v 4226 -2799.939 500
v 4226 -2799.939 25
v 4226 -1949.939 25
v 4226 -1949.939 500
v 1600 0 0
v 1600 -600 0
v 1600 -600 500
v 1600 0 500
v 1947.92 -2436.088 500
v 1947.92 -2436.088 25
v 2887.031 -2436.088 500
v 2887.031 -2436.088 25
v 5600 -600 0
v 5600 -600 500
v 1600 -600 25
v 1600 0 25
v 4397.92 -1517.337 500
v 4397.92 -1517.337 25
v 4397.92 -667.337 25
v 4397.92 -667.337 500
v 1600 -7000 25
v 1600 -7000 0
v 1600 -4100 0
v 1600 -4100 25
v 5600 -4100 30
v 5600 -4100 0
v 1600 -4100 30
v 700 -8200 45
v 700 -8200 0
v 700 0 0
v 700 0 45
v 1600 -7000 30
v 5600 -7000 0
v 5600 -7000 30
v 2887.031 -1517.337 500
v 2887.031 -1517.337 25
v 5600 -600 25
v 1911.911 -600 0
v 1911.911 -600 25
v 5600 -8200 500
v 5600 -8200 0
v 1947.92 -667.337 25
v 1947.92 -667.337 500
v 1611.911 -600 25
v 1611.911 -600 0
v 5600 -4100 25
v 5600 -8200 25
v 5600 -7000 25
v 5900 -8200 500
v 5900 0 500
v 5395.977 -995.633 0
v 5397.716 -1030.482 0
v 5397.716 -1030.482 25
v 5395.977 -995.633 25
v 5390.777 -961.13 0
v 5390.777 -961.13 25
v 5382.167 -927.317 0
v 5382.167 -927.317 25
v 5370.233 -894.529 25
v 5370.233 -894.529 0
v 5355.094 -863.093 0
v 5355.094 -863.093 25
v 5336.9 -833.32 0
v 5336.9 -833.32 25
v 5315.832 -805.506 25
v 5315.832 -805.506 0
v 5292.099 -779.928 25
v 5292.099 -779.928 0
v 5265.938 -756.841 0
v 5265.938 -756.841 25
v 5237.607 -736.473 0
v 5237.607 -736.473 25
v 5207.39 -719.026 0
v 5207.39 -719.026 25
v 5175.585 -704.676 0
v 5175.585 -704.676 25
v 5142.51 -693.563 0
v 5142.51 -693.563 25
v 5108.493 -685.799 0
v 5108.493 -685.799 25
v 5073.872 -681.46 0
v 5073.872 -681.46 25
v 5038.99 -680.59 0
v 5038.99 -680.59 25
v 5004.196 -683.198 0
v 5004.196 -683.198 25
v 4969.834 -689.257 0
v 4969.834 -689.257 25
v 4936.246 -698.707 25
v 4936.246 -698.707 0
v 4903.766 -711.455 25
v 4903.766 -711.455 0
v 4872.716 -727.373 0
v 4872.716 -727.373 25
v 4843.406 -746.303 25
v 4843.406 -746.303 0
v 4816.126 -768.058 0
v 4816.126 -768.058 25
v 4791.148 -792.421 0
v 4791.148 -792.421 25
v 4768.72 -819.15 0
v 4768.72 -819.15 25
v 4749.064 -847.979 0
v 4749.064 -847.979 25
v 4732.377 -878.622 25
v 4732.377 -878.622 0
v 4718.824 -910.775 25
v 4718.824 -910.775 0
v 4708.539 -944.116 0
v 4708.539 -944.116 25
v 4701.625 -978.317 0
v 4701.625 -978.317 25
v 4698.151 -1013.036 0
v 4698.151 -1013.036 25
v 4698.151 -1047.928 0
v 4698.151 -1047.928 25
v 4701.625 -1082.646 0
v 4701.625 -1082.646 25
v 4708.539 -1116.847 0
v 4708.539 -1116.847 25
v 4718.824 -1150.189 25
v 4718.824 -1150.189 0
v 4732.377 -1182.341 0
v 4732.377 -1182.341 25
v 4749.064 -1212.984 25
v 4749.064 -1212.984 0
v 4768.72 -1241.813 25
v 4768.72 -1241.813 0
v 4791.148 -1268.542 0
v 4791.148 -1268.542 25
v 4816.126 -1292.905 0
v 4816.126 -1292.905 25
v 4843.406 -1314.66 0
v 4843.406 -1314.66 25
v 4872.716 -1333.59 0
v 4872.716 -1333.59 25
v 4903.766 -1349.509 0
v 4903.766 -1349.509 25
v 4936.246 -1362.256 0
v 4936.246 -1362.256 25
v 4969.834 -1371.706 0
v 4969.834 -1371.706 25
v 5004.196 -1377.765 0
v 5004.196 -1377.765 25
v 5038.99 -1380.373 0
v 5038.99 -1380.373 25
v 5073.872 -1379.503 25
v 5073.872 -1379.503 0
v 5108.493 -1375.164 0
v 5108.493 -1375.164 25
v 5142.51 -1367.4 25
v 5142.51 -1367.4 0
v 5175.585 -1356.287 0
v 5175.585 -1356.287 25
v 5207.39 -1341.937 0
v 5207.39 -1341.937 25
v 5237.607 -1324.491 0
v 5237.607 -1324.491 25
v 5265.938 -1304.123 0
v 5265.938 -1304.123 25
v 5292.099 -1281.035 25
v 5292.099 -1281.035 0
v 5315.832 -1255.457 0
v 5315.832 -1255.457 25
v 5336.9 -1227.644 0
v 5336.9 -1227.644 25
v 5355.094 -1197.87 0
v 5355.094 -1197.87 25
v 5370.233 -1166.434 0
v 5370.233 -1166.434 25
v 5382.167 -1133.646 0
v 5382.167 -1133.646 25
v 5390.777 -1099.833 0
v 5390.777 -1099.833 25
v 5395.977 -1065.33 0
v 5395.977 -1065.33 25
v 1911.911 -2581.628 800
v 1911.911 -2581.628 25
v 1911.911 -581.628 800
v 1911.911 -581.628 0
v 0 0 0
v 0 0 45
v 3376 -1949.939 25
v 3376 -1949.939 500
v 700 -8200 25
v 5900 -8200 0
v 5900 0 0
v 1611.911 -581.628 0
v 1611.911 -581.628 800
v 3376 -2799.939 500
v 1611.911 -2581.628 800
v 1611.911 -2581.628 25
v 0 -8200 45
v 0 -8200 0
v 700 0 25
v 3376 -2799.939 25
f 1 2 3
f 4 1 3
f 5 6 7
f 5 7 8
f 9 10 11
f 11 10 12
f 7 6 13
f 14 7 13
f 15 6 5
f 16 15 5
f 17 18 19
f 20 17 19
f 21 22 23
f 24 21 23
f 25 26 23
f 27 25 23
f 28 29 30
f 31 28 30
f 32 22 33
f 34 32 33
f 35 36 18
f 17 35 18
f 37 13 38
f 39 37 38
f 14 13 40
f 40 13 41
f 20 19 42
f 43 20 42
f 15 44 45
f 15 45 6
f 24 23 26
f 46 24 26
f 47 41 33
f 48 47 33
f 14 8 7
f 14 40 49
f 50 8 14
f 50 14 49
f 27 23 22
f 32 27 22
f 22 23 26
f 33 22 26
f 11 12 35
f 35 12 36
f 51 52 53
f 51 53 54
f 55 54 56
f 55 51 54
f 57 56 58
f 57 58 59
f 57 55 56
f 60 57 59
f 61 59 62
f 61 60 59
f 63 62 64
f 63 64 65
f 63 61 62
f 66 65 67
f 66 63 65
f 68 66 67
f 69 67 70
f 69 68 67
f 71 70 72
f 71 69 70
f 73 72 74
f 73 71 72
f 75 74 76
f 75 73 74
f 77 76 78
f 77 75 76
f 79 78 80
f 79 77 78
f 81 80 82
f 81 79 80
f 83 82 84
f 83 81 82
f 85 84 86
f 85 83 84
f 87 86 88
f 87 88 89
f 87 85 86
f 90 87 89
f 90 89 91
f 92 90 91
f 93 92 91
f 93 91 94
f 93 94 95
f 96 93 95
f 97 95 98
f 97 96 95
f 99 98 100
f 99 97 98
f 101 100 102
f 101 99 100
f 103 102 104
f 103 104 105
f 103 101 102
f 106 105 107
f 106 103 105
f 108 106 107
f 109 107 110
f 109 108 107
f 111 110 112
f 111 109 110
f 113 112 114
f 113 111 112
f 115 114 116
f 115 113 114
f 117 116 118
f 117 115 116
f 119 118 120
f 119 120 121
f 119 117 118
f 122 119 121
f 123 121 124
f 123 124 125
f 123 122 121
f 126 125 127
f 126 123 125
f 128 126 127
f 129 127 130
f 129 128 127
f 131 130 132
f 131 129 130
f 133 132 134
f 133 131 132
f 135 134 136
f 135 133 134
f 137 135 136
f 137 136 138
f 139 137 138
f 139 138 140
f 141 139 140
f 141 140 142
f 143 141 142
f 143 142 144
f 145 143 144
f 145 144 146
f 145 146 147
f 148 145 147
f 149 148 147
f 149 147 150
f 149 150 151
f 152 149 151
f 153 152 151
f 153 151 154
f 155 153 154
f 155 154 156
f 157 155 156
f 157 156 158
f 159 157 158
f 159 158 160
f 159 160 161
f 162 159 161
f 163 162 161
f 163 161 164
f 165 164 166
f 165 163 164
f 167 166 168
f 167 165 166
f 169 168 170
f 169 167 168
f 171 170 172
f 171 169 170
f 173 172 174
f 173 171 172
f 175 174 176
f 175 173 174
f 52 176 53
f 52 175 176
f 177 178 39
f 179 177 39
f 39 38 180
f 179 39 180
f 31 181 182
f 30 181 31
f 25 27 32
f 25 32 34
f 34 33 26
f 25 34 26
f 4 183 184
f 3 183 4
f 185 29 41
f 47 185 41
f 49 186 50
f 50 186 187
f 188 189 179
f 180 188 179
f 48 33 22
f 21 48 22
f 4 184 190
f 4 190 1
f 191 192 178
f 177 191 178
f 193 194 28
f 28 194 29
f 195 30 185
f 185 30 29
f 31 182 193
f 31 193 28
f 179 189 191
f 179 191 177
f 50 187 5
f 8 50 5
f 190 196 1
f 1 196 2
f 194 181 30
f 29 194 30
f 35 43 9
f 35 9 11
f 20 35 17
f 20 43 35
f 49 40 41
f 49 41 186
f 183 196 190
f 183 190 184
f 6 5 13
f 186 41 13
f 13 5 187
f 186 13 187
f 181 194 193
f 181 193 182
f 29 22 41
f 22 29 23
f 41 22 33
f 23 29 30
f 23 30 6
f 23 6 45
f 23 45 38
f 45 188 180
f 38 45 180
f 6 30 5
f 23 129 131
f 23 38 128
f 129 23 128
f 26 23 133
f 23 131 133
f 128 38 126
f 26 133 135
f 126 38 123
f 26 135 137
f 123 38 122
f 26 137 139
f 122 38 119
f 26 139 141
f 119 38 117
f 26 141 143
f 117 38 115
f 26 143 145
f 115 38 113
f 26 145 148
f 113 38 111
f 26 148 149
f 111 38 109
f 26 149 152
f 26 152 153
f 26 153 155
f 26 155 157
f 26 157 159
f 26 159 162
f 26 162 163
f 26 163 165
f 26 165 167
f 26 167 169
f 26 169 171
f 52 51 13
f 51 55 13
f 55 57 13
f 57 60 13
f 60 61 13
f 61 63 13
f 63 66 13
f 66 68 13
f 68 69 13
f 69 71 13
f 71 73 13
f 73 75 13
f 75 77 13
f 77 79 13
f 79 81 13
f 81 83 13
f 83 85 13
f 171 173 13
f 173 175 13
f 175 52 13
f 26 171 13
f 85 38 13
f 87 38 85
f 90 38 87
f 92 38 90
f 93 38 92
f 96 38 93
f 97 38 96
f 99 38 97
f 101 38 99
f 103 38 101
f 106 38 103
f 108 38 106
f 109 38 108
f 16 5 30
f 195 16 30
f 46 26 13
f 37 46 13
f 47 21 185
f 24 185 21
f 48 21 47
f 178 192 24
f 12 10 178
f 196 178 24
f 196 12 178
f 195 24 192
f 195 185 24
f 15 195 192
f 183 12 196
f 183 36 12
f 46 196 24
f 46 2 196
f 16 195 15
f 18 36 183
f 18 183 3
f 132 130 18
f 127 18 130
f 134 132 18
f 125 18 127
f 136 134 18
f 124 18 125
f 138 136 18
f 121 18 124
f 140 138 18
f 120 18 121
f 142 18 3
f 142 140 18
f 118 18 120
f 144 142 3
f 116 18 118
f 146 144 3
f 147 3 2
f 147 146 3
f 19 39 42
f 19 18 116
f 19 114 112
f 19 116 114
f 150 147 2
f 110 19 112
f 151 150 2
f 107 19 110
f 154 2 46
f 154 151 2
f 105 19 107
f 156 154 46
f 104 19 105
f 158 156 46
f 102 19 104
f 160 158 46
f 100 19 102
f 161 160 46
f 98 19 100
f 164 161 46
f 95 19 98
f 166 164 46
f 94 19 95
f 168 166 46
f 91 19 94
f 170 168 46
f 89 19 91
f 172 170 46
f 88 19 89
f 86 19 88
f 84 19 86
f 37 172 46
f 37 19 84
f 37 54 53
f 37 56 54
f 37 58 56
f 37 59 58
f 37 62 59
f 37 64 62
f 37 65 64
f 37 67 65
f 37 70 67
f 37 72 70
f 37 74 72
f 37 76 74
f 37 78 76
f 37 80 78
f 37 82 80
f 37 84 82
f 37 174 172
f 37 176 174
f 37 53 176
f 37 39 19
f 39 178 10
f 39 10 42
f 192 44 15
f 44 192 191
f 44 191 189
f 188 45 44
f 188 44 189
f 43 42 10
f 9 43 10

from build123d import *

# Parameters (mm, degrees)
F0_W     = 4000
F0_H     = 600
F1_DEPTH = 500
F0_R     = 350
F2_DEPTH = 25
F0_W_2   = 700
F0_H_2   = 8200
F3_DEPTH = 45
F4_DEPTH = 30
F5_W     = 939.1110420227
F5_H     = 918.7512397766
F5_W_2   = 850
F5_H_2   = 850
F6_DEPTH = 500
F7_W     = 300
F7_H     = 2000
F8_DEPTH = 800


with BuildPart() as f1:
    # F0 (on Top) → F1 (new body)
    with BuildSketch(Plane.XY):
        with Locations((3600, -300)):
            Rectangle(F0_W, F0_H)
        Polygon((5900, 0), (5600, 0), (5600, -600), (5600, -4100), (5600, -7000), (5600, -8200), (5900, -8200), align=None)
    extrude(amount=F1_DEPTH)


with BuildPart() as f2:
    # F0 (on Top) → F2 (new body)
    with BuildSketch(Plane.XY):
        Polygon((1600, 0), (700, 0), (700, -8200), (5600, -8200), (5600, -7000), (2500, -7000), (1600, -7000), (1600, -4100), (5600, -4100), (5600, -600), (1600, -600), align=None)
        with Locations((5047.7161407471, -1030.4815769196)):
            Circle(F0_R, mode=Mode.SUBTRACT)
    extrude(amount=F2_DEPTH)

    # F5 (on Top) → F6 (join)
    with BuildSketch(Plane.XY):
        Polygon((4397.9195594788, -667.3370838165), (1947.9195594788, -667.3370838165), (1947.9195594788, -1517.3370838165), (2887.0306015015, -1517.3370838165), (4397.9195594788, -1517.3370838165), align=None)
        with Locations((2417.4750804901, -1976.7127037048)):
            Rectangle(F5_W, F5_H)
        with Locations((3801.0003089905, -2374.9387979507)):
            Rectangle(F5_W_2, F5_H_2)
    extrude(amount=F6_DEPTH)

    # F7 (on Top) → F8 (join)
    with BuildSketch(Plane.XY):
        with Locations((1761.9111299515, -1581.628203392)):
            Rectangle(F7_W, F7_H)
    extrude(amount=F8_DEPTH)


with BuildPart() as f3:
    # F0 (on Top) → F3 (new body)
    with BuildSketch(Plane.XY):
        with Locations((350, -4100)):
            Rectangle(F0_W_2, F0_H_2)
    extrude(amount=F3_DEPTH)


with BuildPart() as f4:
    # F0 (on Top) → F4 (new body)
    with BuildSketch(Plane.XY):
        Polygon((2500, -7000), (5600, -7000), (5600, -4100), (1600, -4100), (1600, -7000), align=None)
    extrude(amount=F4_DEPTH)


solid = Compound([f1.part, f2.part, f3.part, f4.part])
